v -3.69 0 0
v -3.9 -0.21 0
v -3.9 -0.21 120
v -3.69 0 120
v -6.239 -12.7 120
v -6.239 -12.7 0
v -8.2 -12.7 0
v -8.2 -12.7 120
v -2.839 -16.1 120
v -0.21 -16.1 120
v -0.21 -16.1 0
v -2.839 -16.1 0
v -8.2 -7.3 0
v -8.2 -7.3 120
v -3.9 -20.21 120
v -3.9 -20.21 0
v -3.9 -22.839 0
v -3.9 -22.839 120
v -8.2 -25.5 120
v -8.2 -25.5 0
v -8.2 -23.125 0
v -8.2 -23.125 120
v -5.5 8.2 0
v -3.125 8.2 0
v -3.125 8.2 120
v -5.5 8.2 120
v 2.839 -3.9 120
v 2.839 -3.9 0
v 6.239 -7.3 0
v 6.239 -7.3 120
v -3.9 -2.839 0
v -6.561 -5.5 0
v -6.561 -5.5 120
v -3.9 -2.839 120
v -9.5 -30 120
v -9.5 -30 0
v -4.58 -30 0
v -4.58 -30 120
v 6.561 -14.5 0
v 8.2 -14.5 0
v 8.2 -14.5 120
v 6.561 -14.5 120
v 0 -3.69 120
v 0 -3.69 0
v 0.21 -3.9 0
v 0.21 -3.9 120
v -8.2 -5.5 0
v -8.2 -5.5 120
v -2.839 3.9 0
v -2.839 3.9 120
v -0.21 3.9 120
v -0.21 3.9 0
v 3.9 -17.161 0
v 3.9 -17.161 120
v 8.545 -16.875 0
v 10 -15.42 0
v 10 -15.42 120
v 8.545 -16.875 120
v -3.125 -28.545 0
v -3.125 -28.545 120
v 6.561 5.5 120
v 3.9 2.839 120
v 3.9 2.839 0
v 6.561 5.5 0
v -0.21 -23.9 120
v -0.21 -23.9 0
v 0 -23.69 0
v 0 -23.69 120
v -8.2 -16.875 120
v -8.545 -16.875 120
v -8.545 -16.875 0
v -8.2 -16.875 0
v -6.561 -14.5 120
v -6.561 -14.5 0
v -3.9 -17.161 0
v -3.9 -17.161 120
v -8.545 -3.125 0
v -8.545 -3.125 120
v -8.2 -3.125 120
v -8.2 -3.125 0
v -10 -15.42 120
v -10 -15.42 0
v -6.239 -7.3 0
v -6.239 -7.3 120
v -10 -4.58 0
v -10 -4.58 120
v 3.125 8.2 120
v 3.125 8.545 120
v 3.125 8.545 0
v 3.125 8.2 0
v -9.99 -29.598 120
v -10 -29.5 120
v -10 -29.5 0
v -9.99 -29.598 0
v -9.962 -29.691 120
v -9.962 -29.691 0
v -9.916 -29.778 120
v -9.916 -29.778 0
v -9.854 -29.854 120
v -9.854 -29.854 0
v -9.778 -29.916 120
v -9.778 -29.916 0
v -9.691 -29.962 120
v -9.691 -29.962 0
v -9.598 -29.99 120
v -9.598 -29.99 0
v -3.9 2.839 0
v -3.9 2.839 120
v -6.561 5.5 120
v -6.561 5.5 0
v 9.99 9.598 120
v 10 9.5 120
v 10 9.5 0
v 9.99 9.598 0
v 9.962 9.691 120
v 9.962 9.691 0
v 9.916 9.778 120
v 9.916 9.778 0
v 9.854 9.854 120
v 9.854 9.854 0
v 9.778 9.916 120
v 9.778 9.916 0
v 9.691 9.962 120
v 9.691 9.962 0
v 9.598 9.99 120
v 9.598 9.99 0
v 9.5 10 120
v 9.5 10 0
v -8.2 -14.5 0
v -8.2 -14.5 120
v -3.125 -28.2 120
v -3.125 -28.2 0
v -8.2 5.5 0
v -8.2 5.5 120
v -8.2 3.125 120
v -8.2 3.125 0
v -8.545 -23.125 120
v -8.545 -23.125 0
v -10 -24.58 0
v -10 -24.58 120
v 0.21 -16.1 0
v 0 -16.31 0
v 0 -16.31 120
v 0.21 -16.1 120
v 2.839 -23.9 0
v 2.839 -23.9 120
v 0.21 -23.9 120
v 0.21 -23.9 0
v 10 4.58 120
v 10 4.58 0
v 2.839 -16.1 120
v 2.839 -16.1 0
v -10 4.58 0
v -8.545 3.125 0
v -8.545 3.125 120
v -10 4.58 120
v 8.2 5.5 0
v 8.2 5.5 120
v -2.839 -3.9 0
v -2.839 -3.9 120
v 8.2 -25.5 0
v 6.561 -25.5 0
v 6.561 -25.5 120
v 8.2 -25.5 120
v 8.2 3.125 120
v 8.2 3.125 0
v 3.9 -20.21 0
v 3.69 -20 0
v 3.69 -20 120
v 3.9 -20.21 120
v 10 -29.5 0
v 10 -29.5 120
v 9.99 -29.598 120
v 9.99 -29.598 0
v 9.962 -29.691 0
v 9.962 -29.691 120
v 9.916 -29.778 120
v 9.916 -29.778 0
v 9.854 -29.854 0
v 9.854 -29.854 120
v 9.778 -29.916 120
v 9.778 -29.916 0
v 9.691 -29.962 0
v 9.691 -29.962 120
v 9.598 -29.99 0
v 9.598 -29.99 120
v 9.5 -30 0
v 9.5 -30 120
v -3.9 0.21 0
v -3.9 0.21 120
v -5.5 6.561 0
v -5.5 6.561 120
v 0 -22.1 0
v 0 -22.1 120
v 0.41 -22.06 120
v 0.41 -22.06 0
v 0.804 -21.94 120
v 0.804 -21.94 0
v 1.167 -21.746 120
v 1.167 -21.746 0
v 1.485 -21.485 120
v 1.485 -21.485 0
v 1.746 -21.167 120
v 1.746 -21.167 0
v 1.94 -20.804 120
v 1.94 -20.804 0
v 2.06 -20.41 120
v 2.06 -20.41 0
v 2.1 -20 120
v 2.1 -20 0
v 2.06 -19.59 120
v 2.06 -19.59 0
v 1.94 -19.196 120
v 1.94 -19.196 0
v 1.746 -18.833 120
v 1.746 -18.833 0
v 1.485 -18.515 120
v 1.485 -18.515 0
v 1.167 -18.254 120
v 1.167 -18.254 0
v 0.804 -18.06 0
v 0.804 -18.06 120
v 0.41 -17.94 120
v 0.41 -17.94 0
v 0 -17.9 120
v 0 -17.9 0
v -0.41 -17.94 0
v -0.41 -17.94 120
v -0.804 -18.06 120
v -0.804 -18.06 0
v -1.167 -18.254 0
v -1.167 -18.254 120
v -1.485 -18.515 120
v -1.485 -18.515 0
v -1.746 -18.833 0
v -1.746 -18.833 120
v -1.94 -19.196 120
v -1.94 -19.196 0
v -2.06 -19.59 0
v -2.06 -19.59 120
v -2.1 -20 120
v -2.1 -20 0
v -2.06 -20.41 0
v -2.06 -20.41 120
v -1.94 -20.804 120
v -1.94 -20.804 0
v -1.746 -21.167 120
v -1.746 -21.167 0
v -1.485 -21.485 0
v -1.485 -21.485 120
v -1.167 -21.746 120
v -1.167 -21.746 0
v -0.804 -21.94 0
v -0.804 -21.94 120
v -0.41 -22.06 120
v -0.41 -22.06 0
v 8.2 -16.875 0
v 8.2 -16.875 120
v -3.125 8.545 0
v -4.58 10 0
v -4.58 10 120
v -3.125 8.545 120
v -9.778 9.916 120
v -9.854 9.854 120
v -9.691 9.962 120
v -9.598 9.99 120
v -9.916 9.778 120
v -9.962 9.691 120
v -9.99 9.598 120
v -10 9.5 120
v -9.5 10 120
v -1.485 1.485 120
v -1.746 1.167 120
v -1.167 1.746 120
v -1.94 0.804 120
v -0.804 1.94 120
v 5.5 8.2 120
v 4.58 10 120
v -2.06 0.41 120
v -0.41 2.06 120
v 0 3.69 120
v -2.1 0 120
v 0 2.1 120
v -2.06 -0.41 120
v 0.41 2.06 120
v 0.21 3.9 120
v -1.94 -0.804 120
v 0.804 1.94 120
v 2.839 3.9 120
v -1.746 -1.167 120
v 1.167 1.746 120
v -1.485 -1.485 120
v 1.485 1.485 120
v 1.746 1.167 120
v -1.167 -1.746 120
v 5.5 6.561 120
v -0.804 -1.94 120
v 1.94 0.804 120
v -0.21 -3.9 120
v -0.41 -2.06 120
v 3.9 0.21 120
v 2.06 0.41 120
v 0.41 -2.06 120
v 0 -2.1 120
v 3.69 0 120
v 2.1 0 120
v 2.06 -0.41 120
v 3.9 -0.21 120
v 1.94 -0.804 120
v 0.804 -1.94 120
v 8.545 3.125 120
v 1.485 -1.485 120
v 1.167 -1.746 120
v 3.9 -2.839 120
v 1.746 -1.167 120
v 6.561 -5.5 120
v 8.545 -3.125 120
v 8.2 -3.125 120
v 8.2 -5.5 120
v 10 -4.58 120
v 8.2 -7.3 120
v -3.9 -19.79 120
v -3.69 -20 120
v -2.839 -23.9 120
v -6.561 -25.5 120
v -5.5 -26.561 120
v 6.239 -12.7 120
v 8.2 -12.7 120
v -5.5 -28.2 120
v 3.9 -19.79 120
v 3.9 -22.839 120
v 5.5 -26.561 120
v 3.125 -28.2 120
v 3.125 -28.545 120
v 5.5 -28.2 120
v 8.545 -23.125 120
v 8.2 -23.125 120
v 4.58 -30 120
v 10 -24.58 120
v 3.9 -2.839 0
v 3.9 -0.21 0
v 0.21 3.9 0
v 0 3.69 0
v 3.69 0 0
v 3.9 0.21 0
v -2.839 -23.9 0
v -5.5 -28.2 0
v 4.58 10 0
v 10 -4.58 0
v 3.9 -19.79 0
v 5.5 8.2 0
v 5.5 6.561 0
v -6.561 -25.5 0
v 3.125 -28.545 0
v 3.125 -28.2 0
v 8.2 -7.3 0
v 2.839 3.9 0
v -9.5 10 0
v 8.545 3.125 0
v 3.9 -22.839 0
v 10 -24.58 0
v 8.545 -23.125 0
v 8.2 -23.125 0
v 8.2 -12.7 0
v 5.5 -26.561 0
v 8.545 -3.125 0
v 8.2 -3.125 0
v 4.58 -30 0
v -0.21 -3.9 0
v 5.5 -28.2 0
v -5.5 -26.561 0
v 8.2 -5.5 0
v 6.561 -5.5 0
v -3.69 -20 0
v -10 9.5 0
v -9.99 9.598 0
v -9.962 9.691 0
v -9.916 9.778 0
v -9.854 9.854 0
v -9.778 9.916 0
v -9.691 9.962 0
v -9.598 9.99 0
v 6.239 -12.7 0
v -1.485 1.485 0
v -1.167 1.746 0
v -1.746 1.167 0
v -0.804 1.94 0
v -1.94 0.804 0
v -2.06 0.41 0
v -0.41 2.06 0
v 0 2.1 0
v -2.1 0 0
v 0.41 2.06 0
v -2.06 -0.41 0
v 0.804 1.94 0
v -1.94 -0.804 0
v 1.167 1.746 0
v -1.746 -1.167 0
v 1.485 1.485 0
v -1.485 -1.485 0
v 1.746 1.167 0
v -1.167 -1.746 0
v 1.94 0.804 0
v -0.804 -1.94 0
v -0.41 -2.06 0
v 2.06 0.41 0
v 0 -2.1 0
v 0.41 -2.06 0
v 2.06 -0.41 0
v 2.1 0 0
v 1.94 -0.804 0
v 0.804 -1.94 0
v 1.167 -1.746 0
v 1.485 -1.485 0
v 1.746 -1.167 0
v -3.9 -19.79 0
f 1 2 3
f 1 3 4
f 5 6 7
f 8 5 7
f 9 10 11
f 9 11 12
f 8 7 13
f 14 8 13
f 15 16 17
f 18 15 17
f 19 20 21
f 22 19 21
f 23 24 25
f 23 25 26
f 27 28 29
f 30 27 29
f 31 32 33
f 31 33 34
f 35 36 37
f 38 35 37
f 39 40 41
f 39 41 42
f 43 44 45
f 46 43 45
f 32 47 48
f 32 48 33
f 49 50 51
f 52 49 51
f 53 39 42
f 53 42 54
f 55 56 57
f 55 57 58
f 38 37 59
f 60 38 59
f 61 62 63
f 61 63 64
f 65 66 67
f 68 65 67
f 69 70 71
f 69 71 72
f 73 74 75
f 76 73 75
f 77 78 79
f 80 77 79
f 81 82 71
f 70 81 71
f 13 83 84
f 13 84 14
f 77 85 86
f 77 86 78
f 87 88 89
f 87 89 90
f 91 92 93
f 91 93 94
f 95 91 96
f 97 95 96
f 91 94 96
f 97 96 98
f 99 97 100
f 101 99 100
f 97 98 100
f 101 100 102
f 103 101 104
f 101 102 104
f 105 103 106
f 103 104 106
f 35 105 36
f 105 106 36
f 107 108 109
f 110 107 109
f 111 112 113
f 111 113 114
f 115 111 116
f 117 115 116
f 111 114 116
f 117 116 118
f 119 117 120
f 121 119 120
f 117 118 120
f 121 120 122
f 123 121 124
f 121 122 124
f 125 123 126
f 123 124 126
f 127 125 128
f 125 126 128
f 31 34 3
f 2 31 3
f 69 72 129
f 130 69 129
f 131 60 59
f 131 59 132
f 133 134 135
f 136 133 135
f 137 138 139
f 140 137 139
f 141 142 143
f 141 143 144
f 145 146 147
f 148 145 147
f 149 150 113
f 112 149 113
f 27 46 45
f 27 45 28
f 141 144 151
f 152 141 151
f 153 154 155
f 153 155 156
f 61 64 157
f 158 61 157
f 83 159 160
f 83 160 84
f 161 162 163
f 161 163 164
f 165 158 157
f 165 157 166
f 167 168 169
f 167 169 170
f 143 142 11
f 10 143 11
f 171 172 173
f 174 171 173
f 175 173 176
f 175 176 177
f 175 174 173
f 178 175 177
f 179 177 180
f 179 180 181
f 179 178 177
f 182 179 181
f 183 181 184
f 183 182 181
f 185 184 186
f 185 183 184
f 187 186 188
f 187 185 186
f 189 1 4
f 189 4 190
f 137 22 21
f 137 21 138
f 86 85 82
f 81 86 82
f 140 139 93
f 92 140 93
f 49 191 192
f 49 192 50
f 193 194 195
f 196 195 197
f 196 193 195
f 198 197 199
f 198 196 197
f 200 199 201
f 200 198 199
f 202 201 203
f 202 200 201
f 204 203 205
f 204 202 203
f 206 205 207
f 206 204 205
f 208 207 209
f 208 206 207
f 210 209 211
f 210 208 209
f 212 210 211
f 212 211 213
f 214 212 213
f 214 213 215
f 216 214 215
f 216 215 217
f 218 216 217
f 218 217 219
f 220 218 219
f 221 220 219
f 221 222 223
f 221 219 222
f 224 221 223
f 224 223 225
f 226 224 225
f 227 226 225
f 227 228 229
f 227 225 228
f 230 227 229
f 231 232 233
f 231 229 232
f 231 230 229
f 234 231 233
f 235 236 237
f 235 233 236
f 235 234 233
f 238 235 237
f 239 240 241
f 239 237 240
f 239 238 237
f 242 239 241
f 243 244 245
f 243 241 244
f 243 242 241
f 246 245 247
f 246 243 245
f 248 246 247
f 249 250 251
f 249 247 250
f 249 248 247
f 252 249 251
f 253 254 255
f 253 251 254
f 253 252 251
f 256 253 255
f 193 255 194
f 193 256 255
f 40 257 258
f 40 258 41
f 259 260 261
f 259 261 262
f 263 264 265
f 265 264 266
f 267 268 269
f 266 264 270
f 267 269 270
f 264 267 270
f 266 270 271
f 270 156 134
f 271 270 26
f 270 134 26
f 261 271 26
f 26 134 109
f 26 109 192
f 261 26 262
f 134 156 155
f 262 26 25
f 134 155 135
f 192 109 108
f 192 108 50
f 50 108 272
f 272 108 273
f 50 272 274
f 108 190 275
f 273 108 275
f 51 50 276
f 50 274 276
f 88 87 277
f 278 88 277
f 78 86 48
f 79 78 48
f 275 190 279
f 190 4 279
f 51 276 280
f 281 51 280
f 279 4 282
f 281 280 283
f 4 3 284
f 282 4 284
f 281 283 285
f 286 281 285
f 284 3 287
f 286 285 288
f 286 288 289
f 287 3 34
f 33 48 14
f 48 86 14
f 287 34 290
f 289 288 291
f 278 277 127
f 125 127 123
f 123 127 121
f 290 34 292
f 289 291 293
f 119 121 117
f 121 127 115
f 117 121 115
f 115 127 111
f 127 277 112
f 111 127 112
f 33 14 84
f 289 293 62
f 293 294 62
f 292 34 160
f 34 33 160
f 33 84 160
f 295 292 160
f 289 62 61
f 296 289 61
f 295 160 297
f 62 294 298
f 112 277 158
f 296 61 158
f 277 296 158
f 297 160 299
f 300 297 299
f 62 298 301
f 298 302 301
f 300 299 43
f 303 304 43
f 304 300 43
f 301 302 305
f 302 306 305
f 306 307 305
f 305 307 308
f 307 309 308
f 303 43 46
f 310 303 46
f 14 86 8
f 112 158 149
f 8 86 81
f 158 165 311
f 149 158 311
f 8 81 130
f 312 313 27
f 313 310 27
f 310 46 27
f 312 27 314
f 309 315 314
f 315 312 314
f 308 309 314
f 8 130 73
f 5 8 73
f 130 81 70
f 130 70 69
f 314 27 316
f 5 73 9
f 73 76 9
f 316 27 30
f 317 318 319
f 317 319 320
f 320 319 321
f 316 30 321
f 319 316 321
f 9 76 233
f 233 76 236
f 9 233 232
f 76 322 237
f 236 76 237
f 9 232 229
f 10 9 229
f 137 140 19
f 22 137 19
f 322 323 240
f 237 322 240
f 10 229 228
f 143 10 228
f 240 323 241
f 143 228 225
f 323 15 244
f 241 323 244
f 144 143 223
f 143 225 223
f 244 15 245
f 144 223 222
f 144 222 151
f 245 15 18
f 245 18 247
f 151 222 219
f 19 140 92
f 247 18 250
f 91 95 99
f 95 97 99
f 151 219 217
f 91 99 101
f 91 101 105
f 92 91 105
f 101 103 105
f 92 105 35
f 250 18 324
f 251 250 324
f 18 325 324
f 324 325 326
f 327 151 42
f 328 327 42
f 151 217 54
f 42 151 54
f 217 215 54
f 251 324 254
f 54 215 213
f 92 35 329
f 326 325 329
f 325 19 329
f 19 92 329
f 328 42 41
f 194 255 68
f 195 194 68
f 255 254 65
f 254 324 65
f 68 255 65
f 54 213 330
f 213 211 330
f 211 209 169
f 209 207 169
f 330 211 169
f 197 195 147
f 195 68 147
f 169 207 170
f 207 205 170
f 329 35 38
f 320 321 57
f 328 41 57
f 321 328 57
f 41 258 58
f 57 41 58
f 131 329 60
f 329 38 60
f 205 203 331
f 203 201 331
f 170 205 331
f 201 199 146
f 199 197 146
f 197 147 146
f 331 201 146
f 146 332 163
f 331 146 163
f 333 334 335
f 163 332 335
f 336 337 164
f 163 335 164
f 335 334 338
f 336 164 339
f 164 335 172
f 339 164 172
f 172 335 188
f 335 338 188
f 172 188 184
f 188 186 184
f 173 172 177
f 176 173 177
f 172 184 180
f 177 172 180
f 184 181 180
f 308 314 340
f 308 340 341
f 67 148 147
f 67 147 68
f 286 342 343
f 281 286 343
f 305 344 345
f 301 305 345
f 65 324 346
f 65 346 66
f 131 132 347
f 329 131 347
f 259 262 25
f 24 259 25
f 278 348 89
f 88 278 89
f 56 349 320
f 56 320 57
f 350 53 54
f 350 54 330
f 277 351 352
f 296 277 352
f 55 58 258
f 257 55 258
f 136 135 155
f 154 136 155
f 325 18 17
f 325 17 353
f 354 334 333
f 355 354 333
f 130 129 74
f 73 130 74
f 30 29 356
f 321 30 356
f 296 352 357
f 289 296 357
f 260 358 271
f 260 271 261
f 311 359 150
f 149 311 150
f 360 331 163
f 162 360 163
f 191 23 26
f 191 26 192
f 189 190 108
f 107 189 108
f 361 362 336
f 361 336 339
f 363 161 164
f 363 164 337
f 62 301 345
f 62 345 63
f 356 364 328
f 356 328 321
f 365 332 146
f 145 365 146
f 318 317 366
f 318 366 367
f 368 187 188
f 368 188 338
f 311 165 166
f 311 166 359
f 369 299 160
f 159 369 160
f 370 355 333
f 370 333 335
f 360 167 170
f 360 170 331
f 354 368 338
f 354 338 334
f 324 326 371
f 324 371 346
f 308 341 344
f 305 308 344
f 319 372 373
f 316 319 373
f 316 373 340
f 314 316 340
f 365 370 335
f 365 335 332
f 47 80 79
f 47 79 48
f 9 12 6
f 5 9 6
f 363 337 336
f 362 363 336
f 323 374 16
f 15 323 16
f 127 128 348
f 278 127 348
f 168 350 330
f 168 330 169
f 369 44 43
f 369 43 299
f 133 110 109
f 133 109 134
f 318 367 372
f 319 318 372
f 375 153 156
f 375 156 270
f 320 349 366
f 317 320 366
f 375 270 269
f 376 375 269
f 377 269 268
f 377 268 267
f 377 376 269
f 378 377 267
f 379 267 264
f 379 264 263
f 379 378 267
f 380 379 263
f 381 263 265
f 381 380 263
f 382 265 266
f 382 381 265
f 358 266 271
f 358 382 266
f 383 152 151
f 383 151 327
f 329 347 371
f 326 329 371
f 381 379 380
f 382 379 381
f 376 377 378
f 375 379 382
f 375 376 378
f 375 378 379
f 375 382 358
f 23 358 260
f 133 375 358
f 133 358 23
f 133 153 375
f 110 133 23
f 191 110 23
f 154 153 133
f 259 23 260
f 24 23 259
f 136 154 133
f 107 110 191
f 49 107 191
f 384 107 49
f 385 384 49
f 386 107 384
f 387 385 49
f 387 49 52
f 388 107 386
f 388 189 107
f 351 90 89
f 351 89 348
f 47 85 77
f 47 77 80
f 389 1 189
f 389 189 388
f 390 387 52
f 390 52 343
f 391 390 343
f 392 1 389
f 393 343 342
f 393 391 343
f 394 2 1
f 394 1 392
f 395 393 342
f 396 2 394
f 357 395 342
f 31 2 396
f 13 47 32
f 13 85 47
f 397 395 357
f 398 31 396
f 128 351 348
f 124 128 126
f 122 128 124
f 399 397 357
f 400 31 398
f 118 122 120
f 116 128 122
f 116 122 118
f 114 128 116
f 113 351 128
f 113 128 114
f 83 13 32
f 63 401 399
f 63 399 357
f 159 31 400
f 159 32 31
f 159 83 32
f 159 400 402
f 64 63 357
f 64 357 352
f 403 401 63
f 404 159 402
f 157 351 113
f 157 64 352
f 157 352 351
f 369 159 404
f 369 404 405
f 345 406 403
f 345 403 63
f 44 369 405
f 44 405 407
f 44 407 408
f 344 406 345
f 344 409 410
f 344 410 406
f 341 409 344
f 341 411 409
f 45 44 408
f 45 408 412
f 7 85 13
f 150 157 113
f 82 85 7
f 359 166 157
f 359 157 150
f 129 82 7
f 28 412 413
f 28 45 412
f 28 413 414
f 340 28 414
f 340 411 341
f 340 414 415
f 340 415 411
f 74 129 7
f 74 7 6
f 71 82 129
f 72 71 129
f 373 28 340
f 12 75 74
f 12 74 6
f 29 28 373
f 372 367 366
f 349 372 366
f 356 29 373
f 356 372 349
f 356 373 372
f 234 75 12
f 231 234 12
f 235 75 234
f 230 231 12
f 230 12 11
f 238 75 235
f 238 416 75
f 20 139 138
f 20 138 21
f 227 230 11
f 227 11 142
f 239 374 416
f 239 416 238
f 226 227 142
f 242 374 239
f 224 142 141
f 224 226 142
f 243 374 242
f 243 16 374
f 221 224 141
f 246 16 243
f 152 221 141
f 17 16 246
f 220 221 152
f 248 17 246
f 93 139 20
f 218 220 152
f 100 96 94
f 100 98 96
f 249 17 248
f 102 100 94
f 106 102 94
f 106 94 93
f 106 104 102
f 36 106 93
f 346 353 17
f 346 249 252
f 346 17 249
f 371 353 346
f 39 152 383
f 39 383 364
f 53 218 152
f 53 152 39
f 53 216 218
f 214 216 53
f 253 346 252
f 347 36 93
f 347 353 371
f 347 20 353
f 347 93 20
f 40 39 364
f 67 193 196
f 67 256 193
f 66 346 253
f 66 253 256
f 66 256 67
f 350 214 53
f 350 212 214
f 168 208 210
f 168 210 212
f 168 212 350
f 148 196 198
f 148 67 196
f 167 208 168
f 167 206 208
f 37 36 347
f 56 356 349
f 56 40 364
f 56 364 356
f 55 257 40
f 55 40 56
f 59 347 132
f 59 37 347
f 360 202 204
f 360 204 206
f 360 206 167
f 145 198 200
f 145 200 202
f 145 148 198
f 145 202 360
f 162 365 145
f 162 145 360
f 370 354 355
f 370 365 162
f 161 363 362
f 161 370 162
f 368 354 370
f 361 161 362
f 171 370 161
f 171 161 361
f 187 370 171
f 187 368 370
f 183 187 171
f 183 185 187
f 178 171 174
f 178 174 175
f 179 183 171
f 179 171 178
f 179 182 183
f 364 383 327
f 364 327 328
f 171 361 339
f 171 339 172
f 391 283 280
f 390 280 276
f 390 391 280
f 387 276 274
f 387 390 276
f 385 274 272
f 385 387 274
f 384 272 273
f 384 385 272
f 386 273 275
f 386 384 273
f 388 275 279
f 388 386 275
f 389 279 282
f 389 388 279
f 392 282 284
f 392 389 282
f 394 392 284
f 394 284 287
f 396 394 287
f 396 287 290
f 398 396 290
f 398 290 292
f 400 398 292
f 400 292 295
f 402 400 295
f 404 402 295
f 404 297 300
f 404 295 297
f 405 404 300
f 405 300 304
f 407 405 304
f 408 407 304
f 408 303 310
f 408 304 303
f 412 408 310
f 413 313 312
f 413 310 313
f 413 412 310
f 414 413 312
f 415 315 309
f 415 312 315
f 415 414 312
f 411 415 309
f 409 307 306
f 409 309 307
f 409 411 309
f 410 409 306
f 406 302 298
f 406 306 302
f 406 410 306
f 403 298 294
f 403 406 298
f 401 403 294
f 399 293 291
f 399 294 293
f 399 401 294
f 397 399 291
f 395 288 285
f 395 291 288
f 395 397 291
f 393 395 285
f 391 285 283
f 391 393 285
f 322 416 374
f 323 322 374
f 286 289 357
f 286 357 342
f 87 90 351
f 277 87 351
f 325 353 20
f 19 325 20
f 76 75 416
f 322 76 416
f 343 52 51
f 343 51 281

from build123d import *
from build123d.topology import SkipClean

# Parameters (mm, degrees)
BOSS_EXTRU_1_DEPTH     = 120
SYM_TRIE6_COPY_1_DEPTH = 120


with BuildPart() as part:
    # Esquisse1 → Boss.-Extru.1 (new body)
    with BuildSketch(Plane.XY):
        with BuildLine():
            Line((-9.5, 10), (-4.58, 10))
            Line((-4.58, 10), (-3.125, 8.545))
            Line((-3.125, 8.545), (-3.125, 8.2))
            Line((-3.125, 8.2), (-5.5, 8.2))
            Line((-5.5, 8.2), (-5.5, 6.560660172))
            Line((-5.5, 6.560660172), (-2.839339828, 3.9))
            Line((-2.839339828, 3.9), (-0.21, 3.9))
            Line((-0.21, 3.9), (0, 3.69))
            Line((0, 3.69), (0, 2.1))
            ThreePointArc((0, 2.1), (-2.1, 0), (0, -2.1))
            Line((0, -2.1), (0, -3.69))
            Line((0, -3.69), (-0.21, -3.9))
            Line((-0.21, -3.9), (-2.839339828, -3.9))
            Line((-2.839339828, -3.9), (-6.239339828, -7.3))
            Line((-6.239339828, -7.3), (-8.2, -7.3))
            Line((-8.2, -7.3), (-8.2, -10))
            Line((-8.2, -10), (-10, -10))
            Line((-10, -10), (-10, -4.58))
            Line((-10, -4.58), (-8.545, -3.125))
            Line((-8.545, -3.125), (-8.2, -3.125))
            Line((-8.2, -3.125), (-8.2, -5.5))
            Line((-8.2, -5.5), (-6.560660172, -5.5))
            Line((-6.560660172, -5.5), (-3.9, -2.839339828))
            Line((-3.9, -2.839339828), (-3.9, -0.21))
            Line((-3.9, -0.21), (-3.69, 0))
            Line((-3.69, 0), (-3.9, 0.21))
            Line((-3.9, 0.21), (-3.9, 2.839339828))
            Line((-3.9, 2.839339828), (-6.560660172, 5.5))
            Line((-6.560660172, 5.5), (-8.2, 5.5))
            Line((-8.2, 5.5), (-8.2, 3.125))
            Line((-8.2, 3.125), (-8.545, 3.125))
            Line((-8.545, 3.125), (-10, 4.58))
            Line((-10, 4.58), (-10, 9.5))
            ThreePointArc((-10, 9.5), (-9.853553391, 9.853553391), (-9.5, 10))
        make_face()
    boss_extru_1 = extrude(amount=BOSS_EXTRU_1_DEPTH)

    # Symétrie1: Boss.-Extru.1 across plane
    add(boss_extru_1.mirror(Plane(origin=(0, 3.69, 120), x_dir=(0, 0, 1), z_dir=(-1, 0, 0))))

    # Symétrie6: Boss.-Extru.1 across plane
    add(boss_extru_1.mirror(Plane(origin=(-8.2, -10, 120), x_dir=(0, 0, 1), z_dir=(0, 1, 0))))

    # Symétrie6 copy 1 sketch → Symétrie6 copy 1 (add)
    with SkipClean():  # the faces are left unmerged after this step: merging them gives an invalid solid
        with BuildSketch(Plane(origin=(0, -20, 0), x_dir=(-1, 0, 0), z_dir=(0, 0, 1))):
            with BuildLine():
                Line((-9.5, 10), (-4.58, 10))
                Line((-4.58, 10), (-3.125, 8.545))
                Line((-3.125, 8.545), (-3.125, 8.2))
                Line((-3.125, 8.2), (-5.5, 8.2))
                Line((-5.5, 8.2), (-5.5, 6.560660172))
                Line((-5.5, 6.560660172), (-2.839339828, 3.9))
                Line((-2.839339828, 3.9), (-0.21, 3.9))
                Line((-0.21, 3.9), (0, 3.69))
                Line((0, 3.69), (0, 2.1))
                ThreePointArc((0, 2.1), (-2.1, 0), (0, -2.1))
                Line((0, -2.1), (0, -3.69))
                Line((0, -3.69), (-0.21, -3.9))
                Line((-0.21, -3.9), (-2.839339828, -3.9))
                Line((-2.839339828, -3.9), (-6.239339828, -7.3))
                Line((-6.239339828, -7.3), (-8.2, -7.3))
                Line((-8.2, -7.3), (-8.2, -10))
                Line((-8.2, -10), (-10, -10))
                Line((-10, -10), (-10, -4.58))
                Line((-10, -4.58), (-8.545, -3.125))
                Line((-8.545, -3.125), (-8.2, -3.125))
                Line((-8.2, -3.125), (-8.2, -5.5))
                Line((-8.2, -5.5), (-6.560660172, -5.5))
                Line((-6.560660172, -5.5), (-3.9, -2.839339828))
                Line((-3.9, -2.839339828), (-3.9, -0.21))
                Line((-3.9, -0.21), (-3.69, 0))
                Line((-3.69, 0), (-3.9, 0.21))
                Line((-3.9, 0.21), (-3.9, 2.839339828))
                Line((-3.9, 2.839339828), (-6.560660172, 5.5))
                Line((-6.560660172, 5.5), (-8.2, 5.5))
                Line((-8.2, 5.5), (-8.2, 3.125))
                Line((-8.2, 3.125), (-8.545, 3.125))
                Line((-8.545, 3.125), (-10, 4.58))
                Line((-10, 4.58), (-10, 9.5))
                ThreePointArc((-10, 9.5), (-9.853553391, 9.853553391), (-9.5, 10))
            make_face()
        extrude(amount=SYM_TRIE6_COPY_1_DEPTH)


solid = part.part
